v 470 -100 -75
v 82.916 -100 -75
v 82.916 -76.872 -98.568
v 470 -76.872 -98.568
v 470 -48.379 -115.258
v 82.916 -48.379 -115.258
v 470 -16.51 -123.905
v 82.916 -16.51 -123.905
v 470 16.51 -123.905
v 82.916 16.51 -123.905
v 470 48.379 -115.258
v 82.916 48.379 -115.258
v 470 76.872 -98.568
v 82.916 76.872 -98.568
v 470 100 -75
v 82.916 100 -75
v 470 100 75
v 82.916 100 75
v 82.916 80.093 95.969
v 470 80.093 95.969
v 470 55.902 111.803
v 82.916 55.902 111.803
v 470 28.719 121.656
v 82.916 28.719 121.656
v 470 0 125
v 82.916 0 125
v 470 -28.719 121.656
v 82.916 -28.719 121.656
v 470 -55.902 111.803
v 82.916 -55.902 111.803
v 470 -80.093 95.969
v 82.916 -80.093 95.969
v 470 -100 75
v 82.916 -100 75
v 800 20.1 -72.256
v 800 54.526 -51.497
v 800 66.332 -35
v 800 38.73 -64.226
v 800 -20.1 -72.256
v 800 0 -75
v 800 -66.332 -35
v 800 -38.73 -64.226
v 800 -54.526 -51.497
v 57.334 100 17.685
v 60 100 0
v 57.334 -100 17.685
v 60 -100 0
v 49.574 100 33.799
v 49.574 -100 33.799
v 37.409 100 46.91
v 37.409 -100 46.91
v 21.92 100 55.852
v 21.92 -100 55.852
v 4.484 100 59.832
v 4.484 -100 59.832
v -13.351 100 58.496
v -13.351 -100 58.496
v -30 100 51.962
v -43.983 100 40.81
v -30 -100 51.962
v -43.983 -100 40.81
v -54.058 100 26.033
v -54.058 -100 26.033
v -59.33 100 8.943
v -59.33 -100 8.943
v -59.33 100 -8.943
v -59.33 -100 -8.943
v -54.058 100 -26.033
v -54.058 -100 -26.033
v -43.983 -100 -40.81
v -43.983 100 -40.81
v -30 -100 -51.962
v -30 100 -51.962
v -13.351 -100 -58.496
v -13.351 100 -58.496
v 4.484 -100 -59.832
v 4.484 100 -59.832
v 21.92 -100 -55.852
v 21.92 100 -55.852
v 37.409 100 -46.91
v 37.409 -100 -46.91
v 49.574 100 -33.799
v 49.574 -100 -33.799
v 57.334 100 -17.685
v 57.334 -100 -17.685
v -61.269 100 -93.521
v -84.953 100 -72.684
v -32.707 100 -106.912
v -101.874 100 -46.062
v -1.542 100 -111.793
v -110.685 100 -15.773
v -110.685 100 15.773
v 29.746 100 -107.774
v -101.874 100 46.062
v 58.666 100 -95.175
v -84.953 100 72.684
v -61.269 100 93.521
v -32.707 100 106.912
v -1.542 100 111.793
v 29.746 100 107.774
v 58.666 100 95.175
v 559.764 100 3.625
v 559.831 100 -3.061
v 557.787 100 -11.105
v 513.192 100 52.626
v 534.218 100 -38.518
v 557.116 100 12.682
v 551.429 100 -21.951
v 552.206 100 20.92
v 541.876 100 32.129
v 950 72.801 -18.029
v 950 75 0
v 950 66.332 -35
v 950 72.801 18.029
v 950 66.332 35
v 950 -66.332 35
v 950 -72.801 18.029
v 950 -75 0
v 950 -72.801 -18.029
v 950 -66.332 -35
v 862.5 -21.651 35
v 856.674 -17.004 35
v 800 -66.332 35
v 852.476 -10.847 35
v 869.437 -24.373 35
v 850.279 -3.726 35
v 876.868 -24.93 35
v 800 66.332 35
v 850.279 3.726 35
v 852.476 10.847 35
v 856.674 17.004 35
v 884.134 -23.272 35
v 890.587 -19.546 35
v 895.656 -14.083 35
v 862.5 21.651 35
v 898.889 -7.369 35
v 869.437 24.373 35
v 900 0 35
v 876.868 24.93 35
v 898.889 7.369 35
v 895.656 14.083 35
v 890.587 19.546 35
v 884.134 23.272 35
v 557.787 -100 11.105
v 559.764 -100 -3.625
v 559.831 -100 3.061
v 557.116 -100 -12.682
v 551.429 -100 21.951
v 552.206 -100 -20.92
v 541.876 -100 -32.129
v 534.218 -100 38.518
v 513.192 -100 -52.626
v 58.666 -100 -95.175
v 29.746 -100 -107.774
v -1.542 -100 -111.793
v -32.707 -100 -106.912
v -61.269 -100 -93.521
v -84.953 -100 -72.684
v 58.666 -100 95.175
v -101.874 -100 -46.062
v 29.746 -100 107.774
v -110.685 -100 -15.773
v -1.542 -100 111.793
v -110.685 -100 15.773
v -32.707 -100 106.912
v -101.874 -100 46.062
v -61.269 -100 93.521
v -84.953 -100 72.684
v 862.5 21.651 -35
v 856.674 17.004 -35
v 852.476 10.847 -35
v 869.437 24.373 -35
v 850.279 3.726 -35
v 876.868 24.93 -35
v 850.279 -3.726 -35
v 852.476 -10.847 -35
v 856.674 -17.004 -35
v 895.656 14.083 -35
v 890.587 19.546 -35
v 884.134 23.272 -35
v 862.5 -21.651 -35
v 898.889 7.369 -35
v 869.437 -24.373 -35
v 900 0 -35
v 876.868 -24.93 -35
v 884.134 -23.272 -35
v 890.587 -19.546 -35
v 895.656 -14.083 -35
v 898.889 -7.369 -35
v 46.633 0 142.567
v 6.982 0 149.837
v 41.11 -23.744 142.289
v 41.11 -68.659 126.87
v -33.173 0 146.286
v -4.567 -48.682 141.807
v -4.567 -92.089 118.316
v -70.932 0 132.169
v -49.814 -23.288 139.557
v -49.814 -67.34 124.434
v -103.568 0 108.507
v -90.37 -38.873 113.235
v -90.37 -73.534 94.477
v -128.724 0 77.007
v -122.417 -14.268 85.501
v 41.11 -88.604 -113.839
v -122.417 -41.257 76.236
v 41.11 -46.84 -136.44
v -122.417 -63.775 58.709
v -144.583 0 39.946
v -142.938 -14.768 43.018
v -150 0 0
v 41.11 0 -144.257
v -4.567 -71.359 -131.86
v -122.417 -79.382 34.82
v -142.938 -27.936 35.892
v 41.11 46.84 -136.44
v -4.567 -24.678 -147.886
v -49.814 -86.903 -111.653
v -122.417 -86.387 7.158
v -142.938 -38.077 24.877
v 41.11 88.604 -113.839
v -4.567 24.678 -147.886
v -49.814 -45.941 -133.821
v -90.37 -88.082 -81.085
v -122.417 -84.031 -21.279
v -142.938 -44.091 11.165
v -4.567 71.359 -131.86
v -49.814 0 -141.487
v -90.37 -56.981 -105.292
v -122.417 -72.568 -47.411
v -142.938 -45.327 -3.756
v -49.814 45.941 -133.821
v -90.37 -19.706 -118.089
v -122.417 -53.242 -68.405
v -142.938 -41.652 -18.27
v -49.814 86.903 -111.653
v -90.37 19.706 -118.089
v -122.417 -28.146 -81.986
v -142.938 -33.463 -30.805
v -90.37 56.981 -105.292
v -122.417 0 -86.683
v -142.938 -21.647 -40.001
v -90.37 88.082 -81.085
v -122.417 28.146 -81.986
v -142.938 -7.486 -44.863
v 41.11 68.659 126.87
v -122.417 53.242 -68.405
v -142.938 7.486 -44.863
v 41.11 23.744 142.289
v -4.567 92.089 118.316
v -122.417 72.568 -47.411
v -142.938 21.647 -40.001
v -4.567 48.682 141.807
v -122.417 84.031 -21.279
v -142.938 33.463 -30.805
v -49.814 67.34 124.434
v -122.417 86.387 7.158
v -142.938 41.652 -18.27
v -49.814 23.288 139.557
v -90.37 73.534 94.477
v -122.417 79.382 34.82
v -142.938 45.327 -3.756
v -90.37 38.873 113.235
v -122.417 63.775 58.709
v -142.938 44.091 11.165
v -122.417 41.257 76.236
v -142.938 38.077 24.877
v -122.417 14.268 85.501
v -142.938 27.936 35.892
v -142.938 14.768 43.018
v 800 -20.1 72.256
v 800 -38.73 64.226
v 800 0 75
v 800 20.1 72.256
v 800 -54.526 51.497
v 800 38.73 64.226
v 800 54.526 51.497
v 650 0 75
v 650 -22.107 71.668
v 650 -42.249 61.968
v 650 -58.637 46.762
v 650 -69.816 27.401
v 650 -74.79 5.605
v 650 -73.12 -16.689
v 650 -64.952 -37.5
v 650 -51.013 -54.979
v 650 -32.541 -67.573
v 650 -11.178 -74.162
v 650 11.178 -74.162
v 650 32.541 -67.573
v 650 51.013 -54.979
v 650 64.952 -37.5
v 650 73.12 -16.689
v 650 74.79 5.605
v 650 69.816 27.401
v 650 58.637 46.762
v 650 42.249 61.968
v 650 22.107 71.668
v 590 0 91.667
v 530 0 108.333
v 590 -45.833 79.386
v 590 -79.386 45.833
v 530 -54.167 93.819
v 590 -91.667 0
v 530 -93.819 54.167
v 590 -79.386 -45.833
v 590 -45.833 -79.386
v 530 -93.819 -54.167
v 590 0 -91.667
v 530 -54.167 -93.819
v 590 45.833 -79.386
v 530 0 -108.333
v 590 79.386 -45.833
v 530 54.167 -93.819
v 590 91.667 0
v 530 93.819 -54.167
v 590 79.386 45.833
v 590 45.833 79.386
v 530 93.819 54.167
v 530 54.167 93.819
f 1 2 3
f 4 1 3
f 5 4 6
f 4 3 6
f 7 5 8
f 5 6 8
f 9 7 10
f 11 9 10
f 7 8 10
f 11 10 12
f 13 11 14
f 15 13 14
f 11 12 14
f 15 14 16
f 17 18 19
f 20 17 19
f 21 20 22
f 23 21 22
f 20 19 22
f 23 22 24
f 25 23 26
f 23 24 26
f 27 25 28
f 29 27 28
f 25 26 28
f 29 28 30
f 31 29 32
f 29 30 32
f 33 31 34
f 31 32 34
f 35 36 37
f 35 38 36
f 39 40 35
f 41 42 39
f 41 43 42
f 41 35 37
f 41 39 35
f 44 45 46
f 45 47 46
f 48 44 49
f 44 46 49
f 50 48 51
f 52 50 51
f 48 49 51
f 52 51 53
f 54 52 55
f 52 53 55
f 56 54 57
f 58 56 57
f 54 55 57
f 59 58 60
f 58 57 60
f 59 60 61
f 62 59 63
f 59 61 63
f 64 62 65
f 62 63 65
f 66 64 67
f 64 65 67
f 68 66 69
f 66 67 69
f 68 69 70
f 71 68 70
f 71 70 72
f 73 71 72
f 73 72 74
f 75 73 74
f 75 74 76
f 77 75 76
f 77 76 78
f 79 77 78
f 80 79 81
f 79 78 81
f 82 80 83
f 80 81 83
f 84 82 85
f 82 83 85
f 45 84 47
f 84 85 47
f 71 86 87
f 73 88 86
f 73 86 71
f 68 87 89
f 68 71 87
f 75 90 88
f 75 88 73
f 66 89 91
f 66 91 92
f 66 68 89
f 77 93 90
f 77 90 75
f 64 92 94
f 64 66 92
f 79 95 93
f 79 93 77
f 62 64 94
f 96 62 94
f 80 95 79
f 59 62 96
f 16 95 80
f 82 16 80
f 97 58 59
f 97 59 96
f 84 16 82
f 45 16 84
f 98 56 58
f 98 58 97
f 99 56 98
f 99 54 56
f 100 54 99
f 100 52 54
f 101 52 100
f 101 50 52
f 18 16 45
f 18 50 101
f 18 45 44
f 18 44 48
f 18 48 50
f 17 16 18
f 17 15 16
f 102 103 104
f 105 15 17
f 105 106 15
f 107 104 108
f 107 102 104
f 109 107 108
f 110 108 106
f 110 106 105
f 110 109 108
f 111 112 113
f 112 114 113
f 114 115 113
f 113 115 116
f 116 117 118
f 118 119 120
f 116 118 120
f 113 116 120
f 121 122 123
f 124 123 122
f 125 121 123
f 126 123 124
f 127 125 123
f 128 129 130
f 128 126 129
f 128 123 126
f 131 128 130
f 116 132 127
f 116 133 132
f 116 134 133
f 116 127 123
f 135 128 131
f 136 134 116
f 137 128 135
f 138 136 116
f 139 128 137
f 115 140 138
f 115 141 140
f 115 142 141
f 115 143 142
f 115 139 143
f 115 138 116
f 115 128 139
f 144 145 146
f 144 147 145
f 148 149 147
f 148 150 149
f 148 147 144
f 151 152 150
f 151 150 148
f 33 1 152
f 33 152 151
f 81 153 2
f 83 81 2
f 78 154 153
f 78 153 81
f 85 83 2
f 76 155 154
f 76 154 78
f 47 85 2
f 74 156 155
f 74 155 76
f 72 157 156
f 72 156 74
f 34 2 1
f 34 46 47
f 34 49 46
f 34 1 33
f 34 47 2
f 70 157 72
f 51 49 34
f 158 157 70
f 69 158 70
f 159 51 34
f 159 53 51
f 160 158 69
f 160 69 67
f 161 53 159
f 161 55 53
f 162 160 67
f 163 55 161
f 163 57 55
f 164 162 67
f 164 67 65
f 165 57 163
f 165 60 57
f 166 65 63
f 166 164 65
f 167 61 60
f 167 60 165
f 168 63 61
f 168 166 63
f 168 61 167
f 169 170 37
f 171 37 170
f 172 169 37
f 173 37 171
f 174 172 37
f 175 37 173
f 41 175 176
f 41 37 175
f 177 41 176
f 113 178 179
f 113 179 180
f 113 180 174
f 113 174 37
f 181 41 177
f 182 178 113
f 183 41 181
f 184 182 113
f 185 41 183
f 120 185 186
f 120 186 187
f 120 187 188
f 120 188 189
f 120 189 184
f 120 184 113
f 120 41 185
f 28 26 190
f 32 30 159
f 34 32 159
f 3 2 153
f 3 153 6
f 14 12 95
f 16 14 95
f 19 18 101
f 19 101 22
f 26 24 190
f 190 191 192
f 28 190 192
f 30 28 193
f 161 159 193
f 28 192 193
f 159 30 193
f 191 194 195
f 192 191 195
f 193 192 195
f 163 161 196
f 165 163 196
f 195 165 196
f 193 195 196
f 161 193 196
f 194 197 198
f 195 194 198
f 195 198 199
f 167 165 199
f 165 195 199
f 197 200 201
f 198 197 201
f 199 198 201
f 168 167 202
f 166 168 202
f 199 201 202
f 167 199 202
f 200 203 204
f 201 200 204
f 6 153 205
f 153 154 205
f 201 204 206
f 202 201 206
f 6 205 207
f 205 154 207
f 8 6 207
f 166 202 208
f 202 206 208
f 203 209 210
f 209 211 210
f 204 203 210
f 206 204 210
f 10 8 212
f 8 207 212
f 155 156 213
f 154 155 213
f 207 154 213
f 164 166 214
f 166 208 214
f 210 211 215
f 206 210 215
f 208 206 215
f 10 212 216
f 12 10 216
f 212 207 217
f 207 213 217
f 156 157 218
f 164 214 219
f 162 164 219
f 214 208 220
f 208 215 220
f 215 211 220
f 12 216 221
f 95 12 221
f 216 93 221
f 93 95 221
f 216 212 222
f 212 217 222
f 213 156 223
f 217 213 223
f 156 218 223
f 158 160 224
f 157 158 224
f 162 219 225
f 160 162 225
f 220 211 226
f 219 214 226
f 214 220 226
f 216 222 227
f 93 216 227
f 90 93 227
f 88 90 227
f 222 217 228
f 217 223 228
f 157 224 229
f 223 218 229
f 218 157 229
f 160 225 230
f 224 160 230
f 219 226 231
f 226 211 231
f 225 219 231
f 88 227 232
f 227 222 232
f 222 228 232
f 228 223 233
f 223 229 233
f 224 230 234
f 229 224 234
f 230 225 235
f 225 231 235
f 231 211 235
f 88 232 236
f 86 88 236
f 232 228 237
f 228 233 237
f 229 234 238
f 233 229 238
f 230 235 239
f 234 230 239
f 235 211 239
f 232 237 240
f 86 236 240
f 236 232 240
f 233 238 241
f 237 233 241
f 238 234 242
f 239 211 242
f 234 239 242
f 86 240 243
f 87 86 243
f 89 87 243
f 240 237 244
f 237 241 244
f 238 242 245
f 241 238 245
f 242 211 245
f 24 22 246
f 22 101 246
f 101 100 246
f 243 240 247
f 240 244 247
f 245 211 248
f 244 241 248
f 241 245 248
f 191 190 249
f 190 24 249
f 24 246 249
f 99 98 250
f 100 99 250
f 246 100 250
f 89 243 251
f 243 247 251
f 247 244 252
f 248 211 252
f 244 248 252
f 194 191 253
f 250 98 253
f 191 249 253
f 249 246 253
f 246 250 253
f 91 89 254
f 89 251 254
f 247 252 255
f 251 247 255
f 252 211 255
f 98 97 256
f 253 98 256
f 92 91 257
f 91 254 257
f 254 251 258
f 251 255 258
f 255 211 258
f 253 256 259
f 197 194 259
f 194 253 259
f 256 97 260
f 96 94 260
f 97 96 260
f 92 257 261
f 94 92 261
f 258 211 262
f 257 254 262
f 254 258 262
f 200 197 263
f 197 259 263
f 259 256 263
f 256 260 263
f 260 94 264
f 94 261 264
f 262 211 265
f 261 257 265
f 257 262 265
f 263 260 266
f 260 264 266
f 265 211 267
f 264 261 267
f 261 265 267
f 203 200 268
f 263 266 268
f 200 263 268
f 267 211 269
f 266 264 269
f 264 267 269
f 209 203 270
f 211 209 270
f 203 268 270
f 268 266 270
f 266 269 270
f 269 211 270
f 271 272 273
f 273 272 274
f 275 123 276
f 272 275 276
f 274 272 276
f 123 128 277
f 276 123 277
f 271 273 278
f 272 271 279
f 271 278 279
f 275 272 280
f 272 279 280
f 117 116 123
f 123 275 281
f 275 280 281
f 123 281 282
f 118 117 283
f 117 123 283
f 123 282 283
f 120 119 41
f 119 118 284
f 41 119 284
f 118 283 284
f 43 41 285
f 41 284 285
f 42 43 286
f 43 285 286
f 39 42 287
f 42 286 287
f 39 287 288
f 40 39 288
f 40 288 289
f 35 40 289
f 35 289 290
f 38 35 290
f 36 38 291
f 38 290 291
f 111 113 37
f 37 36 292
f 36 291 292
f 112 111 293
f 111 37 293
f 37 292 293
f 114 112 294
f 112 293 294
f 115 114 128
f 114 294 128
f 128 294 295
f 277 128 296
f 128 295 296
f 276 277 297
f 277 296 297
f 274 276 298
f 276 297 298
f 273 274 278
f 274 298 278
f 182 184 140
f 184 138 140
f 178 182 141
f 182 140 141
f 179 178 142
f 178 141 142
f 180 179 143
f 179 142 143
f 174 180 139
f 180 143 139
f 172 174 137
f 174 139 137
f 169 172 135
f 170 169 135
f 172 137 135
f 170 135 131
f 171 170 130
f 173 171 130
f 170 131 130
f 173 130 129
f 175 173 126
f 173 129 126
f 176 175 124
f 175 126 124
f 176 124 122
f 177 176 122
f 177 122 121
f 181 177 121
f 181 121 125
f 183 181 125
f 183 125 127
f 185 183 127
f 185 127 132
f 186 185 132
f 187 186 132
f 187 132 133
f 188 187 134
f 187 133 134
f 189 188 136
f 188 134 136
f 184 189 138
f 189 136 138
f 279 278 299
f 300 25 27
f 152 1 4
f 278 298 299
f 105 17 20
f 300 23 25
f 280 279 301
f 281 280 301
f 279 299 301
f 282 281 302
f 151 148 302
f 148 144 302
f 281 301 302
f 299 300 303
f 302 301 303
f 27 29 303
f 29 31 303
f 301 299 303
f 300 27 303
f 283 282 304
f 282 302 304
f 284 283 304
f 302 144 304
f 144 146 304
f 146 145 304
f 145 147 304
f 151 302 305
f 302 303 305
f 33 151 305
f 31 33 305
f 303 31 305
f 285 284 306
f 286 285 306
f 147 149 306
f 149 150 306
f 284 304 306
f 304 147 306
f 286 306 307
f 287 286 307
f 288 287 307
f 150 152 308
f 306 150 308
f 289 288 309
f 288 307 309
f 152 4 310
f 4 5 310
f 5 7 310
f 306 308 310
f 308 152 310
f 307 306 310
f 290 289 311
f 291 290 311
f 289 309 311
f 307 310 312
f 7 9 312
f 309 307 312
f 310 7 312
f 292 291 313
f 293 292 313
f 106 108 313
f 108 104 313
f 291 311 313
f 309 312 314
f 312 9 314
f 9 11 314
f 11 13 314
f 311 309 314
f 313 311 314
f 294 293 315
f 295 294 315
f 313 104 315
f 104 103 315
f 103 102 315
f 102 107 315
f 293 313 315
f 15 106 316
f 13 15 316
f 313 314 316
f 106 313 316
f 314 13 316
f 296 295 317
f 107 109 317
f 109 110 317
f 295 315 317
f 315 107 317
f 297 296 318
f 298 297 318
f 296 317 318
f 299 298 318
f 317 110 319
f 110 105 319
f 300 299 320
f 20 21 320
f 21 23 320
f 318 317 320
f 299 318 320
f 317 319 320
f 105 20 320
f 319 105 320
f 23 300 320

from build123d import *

# Parameters (mm, degrees)
F3_R     = 60
F6_DEPTH = 250
F2_W     = 50
F2_H     = 300
F7_DEPTH = 625
F0_W     = 150
F0_H     = 40
F8_DEPTH = 75
F1_R     = 25
F9_DEPTH = 35


with BuildPart() as f5:
    # F4 (on Front) → F5 (revolve)
    with BuildSketch(Plane.XZ):
        with BuildLine():
            Line((470, 125), (82.91562, 125))
            ThreePointArc((82.91562, 125), (-70.931858, 132.169102), (-150, 0))
            Line((-150, 0), (950, 0))
            Line((950, 0), (950, 75))
            Line((950, 75), (650, 75))
            Line((650, 75), (470, 125))
        make_face()
    revolve(axis=Axis((400, 0, 0), (1, 0, 0)))

    # F3 (on Front) → F6 (cut, symmetric)
    with BuildSketch(Plane.XZ):
        Circle(F3_R)
    extrude(amount=F6_DEPTH, both=True, mode=Mode.SUBTRACT)

    # F2 (on Right) → F7 (cut, symmetric)
    with BuildSketch(Plane.YZ):
        with Locations((-125, 0)):
            Rectangle(F2_W, F2_H)
        with Locations((125, 0)):
            Rectangle(F2_W, F2_H)
    extrude(amount=F7_DEPTH, both=True, mode=Mode.SUBTRACT)

    # F0 (on Front) → F8 (cut, symmetric)
    with BuildSketch(Plane.XZ):
        with Locations((875, 55)):
            Rectangle(F0_W, F0_H)
        with Locations((875, -55)):
            Rectangle(F0_W, F0_H)
    extrude(amount=F8_DEPTH, both=True, mode=Mode.SUBTRACT)

    # F1 (on Top) → F9 (cut, symmetric)
    with BuildSketch(Plane.XY):
        with Locations((875, 0)):
            Circle(F1_R)
    extrude(amount=F9_DEPTH, both=True, mode=Mode.SUBTRACT)


solid = f5.part
